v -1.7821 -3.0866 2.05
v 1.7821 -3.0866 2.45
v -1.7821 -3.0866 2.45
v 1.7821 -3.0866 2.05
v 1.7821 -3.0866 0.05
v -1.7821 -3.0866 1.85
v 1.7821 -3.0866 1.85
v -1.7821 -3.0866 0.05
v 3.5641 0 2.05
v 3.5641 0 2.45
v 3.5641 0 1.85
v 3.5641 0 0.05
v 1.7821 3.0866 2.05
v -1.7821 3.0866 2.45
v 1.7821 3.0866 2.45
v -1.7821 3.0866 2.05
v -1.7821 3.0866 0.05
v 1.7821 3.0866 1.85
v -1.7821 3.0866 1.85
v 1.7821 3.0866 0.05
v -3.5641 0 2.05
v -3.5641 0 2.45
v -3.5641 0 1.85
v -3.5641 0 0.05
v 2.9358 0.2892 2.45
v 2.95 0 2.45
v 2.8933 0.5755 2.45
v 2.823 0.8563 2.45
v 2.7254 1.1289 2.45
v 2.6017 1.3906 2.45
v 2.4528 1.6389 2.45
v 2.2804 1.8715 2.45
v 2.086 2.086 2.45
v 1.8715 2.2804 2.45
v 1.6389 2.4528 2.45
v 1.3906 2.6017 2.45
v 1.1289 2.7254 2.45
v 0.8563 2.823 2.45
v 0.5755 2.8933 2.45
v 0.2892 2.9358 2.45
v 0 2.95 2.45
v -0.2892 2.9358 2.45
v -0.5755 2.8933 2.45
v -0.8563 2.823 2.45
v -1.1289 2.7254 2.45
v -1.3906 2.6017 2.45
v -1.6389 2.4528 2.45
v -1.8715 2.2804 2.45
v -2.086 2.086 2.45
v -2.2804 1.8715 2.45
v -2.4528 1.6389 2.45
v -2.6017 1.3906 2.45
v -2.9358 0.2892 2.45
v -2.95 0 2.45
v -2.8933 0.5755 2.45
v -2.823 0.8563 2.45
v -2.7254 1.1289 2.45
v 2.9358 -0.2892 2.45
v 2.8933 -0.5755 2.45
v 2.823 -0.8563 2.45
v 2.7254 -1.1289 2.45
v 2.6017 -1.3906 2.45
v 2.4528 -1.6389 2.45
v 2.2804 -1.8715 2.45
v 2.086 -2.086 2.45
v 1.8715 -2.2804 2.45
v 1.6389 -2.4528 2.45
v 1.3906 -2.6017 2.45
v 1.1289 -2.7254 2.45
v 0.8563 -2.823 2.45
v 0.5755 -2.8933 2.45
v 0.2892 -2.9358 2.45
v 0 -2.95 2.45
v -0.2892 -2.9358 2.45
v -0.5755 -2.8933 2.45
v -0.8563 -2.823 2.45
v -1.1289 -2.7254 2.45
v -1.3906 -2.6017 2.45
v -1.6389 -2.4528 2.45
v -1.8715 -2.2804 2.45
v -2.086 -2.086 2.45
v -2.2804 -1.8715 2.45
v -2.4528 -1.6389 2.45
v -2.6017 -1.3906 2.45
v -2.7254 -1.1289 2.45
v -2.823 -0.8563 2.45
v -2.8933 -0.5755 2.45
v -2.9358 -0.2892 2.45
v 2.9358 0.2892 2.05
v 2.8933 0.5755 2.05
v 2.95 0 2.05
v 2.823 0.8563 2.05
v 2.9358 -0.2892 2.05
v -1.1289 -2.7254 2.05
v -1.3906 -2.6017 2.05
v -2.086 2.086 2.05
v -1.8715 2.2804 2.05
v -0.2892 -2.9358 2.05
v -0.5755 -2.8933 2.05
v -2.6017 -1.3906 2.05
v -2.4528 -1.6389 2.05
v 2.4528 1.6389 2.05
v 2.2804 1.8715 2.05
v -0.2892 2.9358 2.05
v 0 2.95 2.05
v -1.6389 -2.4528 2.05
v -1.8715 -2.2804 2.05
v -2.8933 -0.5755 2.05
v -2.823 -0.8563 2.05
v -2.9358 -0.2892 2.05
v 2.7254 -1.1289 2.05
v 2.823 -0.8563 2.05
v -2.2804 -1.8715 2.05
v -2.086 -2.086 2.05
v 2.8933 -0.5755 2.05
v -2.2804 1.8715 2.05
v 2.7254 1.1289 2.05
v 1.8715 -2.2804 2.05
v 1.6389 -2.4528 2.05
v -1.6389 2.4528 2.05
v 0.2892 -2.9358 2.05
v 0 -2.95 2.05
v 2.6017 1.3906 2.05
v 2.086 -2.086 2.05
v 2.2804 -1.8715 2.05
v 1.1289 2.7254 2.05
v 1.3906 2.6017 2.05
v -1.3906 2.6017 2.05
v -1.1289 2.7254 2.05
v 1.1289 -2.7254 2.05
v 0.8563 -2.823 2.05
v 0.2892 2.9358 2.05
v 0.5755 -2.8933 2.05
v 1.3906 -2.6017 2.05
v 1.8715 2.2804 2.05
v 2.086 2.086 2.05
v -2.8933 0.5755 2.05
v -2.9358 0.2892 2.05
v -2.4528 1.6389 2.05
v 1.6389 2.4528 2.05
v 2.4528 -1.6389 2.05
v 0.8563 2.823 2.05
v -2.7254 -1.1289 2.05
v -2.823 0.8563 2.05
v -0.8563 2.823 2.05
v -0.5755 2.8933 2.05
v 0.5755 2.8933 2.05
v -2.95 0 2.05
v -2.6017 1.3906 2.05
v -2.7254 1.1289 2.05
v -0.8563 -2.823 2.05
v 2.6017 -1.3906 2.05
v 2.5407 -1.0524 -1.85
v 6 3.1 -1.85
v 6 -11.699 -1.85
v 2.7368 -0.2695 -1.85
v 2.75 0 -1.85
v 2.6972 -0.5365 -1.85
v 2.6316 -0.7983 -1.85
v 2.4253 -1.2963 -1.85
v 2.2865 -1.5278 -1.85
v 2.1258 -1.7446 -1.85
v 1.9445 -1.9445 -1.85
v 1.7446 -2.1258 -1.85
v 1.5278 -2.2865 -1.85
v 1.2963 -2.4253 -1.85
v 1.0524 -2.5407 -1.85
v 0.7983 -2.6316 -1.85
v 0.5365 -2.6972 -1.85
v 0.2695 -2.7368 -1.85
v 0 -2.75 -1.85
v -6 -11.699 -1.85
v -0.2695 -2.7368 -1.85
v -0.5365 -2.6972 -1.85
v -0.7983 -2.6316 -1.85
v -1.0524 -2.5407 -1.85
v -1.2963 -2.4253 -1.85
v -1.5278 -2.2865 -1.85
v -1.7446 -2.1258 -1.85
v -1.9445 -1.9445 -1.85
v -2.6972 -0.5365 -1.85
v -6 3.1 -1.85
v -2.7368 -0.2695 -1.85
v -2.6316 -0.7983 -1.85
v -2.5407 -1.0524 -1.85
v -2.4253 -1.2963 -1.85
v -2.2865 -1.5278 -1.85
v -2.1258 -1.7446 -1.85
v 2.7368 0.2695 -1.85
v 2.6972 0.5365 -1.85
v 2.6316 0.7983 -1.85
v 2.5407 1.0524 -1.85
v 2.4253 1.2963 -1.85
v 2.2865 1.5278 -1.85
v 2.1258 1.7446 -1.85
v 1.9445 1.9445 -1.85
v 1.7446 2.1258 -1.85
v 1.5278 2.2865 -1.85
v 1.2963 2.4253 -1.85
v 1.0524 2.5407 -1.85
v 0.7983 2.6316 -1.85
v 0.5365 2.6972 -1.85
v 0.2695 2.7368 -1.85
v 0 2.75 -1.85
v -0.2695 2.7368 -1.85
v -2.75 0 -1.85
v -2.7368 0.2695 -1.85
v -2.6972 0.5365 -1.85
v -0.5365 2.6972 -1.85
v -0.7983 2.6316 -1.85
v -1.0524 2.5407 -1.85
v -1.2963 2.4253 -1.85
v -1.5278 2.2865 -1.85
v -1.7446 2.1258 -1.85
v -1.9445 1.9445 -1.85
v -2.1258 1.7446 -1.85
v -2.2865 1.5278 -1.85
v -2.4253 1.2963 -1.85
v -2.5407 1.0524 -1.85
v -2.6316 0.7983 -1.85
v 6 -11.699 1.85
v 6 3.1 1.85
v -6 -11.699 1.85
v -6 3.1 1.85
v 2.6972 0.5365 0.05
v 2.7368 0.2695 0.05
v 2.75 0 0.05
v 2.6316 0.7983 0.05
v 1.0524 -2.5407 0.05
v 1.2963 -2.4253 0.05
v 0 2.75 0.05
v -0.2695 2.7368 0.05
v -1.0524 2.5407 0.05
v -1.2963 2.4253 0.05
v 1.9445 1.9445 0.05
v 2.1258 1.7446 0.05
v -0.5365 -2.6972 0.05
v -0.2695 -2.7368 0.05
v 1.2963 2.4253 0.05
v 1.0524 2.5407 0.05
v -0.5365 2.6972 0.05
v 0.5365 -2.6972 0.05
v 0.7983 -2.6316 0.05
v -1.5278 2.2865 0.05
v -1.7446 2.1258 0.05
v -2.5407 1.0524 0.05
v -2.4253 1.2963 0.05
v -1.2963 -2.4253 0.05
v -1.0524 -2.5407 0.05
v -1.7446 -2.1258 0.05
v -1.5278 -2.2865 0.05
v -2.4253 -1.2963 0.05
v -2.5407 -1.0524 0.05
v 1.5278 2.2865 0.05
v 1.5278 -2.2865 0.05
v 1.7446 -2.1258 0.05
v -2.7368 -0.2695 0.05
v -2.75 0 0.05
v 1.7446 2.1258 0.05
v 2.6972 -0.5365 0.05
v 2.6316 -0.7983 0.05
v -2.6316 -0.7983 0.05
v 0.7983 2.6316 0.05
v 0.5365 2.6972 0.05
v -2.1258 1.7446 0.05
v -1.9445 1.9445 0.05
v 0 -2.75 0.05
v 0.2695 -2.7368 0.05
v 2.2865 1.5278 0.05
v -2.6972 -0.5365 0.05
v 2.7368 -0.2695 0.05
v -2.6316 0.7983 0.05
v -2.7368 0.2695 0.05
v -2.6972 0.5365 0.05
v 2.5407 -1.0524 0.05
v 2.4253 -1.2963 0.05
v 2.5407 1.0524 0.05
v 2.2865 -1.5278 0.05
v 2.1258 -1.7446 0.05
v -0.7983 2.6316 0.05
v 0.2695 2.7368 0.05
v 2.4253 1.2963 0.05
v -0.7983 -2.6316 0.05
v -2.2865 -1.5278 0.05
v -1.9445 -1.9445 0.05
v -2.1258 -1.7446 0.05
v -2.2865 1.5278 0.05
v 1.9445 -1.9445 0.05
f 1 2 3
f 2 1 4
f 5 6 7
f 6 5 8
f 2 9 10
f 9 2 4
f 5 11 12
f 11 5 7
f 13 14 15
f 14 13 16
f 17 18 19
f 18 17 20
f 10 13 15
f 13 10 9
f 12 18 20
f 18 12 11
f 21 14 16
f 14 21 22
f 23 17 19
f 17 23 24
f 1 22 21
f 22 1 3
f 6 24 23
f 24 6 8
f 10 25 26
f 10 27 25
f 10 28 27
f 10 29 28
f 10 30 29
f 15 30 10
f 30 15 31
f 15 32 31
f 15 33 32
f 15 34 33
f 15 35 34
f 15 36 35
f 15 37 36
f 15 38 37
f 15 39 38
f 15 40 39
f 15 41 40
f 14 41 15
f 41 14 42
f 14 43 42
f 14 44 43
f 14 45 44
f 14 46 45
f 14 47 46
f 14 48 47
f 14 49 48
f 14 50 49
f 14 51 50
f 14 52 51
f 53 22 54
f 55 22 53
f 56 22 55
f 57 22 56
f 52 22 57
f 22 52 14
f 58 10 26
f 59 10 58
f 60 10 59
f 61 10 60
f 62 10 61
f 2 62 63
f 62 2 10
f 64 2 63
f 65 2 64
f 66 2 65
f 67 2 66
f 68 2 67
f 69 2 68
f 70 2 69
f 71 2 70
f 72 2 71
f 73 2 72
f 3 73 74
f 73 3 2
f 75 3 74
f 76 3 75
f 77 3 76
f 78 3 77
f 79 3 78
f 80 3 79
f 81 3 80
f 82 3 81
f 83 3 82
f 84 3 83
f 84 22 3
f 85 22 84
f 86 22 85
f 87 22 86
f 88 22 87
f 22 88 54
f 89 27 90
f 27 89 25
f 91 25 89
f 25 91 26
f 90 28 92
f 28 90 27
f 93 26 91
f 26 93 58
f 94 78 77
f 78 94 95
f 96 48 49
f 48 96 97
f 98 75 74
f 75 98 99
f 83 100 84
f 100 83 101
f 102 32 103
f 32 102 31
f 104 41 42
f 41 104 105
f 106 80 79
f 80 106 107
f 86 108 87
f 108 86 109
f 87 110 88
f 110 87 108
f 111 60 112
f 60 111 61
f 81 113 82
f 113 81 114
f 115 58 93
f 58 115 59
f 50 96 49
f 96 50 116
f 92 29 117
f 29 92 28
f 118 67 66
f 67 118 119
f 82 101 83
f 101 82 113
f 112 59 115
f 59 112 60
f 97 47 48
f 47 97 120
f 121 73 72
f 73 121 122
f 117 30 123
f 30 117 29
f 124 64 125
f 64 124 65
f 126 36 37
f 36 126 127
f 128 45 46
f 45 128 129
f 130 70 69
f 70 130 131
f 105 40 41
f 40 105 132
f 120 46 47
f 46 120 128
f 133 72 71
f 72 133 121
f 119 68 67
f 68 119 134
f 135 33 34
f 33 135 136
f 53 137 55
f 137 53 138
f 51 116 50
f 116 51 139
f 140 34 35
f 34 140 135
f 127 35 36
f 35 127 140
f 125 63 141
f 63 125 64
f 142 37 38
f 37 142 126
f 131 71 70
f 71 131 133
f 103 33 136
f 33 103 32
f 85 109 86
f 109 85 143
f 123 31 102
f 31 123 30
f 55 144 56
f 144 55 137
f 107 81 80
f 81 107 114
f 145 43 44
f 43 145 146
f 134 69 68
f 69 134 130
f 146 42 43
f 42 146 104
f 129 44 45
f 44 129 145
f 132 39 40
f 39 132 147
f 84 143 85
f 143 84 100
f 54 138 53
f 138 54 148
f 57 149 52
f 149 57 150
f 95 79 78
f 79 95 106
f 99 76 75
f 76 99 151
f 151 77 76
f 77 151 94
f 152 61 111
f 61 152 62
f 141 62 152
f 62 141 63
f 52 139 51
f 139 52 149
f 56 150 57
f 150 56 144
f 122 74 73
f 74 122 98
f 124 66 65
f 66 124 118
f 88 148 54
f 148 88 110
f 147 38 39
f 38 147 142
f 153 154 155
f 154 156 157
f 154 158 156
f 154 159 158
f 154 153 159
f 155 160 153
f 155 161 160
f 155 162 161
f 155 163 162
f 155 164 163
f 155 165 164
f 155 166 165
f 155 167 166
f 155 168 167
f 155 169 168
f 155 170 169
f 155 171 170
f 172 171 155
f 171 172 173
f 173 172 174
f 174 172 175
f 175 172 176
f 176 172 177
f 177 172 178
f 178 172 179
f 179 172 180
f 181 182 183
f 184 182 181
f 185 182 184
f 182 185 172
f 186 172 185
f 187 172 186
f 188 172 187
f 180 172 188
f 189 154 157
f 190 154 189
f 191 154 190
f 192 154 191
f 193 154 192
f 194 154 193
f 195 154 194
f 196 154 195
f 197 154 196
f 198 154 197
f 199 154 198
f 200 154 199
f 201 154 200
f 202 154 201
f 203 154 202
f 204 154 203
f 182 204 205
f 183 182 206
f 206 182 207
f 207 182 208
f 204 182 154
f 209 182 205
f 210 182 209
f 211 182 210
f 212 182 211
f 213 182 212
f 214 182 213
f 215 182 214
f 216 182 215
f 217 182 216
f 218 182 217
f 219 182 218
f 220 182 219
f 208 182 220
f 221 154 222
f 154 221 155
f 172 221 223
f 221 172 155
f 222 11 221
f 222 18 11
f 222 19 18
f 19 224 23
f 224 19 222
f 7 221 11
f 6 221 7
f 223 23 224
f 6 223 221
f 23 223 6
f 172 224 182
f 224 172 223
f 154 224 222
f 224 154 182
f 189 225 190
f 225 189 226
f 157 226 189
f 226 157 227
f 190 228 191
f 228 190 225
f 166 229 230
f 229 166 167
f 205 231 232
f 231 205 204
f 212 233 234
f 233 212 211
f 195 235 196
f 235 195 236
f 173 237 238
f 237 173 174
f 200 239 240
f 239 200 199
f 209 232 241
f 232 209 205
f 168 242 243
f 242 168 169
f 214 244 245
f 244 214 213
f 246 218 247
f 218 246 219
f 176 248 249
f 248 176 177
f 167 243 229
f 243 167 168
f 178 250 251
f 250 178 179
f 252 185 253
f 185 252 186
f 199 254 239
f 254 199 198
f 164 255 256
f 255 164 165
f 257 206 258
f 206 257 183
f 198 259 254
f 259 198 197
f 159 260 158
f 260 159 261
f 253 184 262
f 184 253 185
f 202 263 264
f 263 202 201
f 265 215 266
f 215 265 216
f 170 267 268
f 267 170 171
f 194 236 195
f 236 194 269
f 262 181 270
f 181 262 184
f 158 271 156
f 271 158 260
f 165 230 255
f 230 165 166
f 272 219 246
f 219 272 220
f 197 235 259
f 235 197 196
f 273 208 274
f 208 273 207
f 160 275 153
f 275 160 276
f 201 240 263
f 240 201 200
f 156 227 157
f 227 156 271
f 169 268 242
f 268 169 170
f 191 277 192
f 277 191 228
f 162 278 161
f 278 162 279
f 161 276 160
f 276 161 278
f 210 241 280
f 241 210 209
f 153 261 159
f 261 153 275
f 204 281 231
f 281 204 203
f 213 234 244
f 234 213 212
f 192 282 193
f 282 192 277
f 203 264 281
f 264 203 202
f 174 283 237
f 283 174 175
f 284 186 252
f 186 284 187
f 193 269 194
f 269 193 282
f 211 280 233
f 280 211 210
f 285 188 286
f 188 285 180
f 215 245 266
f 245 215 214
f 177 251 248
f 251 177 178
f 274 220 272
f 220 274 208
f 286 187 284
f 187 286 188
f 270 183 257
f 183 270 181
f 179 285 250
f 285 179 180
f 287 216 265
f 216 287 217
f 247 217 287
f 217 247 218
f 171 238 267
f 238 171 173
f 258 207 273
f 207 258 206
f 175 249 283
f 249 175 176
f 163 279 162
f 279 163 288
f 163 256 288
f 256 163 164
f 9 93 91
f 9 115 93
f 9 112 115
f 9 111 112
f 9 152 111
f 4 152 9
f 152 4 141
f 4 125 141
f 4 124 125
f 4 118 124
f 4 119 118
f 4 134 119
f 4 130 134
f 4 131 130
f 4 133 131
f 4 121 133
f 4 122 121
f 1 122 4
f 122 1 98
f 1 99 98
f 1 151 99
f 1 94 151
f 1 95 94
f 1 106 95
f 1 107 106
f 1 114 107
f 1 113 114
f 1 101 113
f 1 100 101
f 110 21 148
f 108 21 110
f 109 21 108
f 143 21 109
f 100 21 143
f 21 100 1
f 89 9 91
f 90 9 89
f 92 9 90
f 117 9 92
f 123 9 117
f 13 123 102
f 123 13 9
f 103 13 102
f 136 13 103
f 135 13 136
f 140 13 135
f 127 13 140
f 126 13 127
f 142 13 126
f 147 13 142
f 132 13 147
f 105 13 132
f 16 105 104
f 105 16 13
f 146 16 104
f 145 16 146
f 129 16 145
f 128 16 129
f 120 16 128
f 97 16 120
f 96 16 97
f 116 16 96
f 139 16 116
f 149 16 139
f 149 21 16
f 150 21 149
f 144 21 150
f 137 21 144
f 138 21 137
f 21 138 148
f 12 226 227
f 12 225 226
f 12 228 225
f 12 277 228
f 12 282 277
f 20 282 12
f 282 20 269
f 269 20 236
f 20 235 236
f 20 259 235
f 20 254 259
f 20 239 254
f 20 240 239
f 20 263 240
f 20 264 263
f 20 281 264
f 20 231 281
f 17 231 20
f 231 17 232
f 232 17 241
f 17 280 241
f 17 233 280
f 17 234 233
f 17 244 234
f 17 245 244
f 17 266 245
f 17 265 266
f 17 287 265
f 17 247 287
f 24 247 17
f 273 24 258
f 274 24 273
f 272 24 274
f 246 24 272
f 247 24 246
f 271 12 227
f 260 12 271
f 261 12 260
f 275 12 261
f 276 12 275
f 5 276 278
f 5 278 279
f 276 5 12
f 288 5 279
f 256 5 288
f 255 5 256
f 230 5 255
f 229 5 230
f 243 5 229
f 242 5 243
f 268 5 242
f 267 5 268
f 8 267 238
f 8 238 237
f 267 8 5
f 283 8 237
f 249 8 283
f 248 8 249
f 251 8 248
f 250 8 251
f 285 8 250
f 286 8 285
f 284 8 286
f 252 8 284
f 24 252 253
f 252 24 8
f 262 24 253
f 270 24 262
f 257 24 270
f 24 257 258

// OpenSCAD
// T-slot nut (single connected solid) for 5.0mm screw, 6.0mm across flats, 3.7mm thick
// FIX: Ensure the hex "nut ring" is NOT floating by making it a positive feature
//      that is unioned to the main body with a small (1-2mm) overlap, then subtract holes.

screw_nominal_diameter_mm = 5.0;
across_flats_mm = 6.0;          // hex across flats (wrench size)
thickness_mm = 3.7;             // overall nut thickness

// Fit / style
tolerance_mm = 0.2;
hole_style_tapped_or_clearance = 0; // 0=clearance, 1=tap-minor
m5_clearance_diameter_mm = 5.5;
m5_tap_minor_diameter_mm = 4.2;

// Typical sliding T-nut proportions (editable)
nut_overall_length_mm = 12.0;   // along slot
nut_overall_width_mm  = 9.6;    // across slot

// T-slot undercut/lip geometry (editable)
lip_height_mm = 1.0;            // thickness of the undercut "head" portion
neck_width_mm = 6.2;            // narrower waist that fits slot opening
lip_overhang_mm = 1.2;          // per-side overhang beyond neck (forms T head)

// Small edge break
edge_chamfer_mm = 0.4;

// Helpers
function clamp(x, a, b) = x < a ? a : (x > b ? b : x);
function hex_circumradius_from_af(af) = af / (2 * cos(30)); // across flats -> circumradius

module tslot_profile_2d(L, W, neckW, lipH, H) {
    neckW2 = clamp(neckW, 0.5, W - 0.01);
    lipH2  = clamp(lipH, 0.0, H - 0.01);

    union() {
        // Upper/neck portion (full length)
        square([L, neckW2], center=true);

        // Lower/head portion (wider), attached to bottom of neck
        if (lipH2 > 0) {
            headW = clamp(neckW2 + 2*lip_overhang_mm, neckW2, W);
            translate([0, -(neckW2/2 + headW/2 - 0.001)])  // tiny overlap in 2D
                square([L, headW], center=true);
        }
    }
}

module tslot_nut() {
    hole_d = ((1 - hole_style_tapped_or_clearance) * m5_clearance_diameter_mm
            + (hole_style_tapped_or_clearance) * m5_tap_minor_diameter_mm);

    // Constrain lip height to keep a solid top section
    lipH = clamp(lip_height_mm, 0.0, thickness_mm - 0.8);

    // Connectivity overlap between the added hex ring and the body (1-2mm required)
    overlap_mm = 1.2;

    // Hex ring geometry (positive feature that must be attached)
    hex_r = hex_circumradius_from_af(across_flats_mm) + tolerance_mm/2;
    ring_wall_mm = 1.2; // radial wall thickness of the ring (keeps design intent: "hex ring with central hole")
    ring_h_mm = 1.8;    // height of the ring feature

    // Place ring so it intersects the top of the body by overlap_mm
    // Body spans Z: [-thickness/2, +thickness/2]
    // Ring spans Z: [z0 - ring_h/2, z0 + ring_h/2]
    // Set ring bottom = body top - overlap => (z0 - ring_h/2) = thickness/2 - overlap
    ring_z = (thickness_mm/2 - overlap_mm) + ring_h_mm/2;

    difference() {
        // Build as a single connected solid: union(body + attached ring)
        union() {
            // Main T-nut body
            linear_extrude(height=thickness_mm, center=true)
                offset(delta=-edge_chamfer_mm)
                    offset(delta=edge_chamfer_mm)
                        tslot_profile_2d(nut_overall_length_mm, nut_overall_width_mm,
                                         neck_width_mm, lipH, thickness_mm);

            // Attached hex "nut ring" (previously appeared floating in some views)
            // This is a POSITIVE feature unioned to the body with guaranteed overlap.
            translate([0, 0, ring_z])
                difference() {
                    cylinder(r=hex_r, h=ring_h_mm, center=true, $fn=6);
                    cylinder(d=hole_d + 2*tolerance_mm, h=ring_h_mm + 2*tolerance_mm, center=true, $fn=64);
                }
        }

        // Central M5 hole through full thickness + through the ring (single continuous hole)
        cylinder(d=hole_d, h=thickness_mm + ring_h_mm + 4*tolerance_mm, center=true, $fn=64);

        // Hex capture recess on TOP face (kept as in original design)
        // Keep a solid floor so the part remains one connected solid.
        hex_depth = min(1.6, thickness_mm - 0.8);
        translate([0, 0, thickness_mm/2 - hex_depth/2])
            cylinder(r=hex_r, h=hex_depth + 2*tolerance_mm, center=true, $fn=6);
    }
}

tslot_nut();
